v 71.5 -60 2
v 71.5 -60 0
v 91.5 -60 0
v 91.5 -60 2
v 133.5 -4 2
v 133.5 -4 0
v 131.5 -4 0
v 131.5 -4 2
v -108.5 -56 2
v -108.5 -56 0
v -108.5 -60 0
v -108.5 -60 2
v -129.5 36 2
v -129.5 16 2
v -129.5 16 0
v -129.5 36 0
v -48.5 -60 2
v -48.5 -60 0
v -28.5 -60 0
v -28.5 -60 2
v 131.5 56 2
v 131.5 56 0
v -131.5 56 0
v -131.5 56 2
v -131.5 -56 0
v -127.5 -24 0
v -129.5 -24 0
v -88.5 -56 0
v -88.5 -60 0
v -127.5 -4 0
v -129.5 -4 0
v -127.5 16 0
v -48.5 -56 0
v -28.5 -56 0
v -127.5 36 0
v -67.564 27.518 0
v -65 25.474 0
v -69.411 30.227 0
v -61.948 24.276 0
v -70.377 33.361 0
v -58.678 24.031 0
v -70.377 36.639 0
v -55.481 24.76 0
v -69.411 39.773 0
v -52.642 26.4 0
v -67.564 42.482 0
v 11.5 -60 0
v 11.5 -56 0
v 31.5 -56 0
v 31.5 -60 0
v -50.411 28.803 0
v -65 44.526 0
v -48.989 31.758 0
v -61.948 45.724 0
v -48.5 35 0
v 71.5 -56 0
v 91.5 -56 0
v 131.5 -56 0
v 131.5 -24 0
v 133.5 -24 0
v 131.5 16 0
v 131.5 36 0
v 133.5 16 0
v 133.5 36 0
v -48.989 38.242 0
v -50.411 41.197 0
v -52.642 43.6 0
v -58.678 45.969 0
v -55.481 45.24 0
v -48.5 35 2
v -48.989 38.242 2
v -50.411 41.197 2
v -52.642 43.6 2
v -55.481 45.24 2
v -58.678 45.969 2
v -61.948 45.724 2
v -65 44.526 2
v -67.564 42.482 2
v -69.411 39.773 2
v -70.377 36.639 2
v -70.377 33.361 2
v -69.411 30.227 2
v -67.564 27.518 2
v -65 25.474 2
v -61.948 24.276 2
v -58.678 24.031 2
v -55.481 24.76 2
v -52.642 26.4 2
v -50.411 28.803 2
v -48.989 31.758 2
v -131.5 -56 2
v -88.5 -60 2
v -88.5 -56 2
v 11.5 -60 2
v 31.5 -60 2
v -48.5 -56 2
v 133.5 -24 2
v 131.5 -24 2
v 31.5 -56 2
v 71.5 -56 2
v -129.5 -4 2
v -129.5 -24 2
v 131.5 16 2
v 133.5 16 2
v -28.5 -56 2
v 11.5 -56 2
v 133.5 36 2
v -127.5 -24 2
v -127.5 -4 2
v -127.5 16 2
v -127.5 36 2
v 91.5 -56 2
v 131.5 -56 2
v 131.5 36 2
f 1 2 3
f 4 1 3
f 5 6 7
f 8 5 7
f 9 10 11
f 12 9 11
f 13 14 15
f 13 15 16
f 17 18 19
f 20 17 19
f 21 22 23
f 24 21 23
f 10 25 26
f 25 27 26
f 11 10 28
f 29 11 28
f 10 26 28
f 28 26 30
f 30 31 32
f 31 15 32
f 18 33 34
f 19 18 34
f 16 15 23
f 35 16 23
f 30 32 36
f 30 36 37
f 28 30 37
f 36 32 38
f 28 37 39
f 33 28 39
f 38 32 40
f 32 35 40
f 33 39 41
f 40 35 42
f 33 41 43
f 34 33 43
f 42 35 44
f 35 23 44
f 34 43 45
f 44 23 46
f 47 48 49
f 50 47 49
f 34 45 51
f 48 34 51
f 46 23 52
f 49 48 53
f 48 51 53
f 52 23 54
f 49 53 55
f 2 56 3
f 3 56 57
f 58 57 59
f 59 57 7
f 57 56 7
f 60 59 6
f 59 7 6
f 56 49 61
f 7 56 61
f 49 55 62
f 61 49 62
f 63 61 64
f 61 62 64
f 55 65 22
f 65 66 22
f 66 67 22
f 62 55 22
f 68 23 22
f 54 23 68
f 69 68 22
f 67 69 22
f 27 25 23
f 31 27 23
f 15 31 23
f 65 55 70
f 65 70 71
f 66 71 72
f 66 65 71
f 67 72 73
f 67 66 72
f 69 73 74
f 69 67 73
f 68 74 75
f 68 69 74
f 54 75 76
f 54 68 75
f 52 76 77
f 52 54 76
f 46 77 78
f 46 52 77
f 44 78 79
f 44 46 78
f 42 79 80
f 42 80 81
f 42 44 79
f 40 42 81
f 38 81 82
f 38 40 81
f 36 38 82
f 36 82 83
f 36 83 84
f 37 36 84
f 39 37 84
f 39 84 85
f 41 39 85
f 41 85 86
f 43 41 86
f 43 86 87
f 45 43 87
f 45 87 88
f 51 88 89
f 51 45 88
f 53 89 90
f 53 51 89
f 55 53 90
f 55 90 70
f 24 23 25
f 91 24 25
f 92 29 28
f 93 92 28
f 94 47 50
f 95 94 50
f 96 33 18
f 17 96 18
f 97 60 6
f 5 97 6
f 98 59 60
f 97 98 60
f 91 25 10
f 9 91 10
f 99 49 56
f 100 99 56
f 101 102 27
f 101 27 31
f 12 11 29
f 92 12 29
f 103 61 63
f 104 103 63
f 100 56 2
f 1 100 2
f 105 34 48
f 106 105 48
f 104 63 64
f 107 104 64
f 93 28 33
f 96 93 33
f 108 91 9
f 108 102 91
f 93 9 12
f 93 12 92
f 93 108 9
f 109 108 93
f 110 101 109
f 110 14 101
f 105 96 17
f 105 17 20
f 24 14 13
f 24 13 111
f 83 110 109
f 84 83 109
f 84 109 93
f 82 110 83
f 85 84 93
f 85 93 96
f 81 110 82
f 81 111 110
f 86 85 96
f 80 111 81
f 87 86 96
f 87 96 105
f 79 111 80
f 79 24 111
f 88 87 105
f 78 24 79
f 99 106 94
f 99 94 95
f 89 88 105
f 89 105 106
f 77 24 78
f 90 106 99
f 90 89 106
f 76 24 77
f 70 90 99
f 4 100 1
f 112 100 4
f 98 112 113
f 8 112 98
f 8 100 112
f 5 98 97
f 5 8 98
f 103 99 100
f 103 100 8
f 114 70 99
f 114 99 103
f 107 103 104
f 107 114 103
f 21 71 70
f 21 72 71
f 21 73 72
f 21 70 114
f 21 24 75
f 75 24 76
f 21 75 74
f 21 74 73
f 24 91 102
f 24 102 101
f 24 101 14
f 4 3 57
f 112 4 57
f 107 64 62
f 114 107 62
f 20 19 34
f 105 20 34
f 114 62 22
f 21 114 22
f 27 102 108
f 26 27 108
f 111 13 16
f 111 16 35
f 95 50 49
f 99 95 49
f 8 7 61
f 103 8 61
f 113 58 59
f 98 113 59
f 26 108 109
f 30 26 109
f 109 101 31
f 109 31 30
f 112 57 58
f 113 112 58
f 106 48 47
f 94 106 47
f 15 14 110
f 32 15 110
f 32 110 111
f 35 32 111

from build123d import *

# Parameters (mm, degrees)
SKETCH1_R           = 11
BOSS_EXTRUDE1_DEPTH = 2
SKETCH2_W           = 2
SKETCH2_H           = 20
CUT_EXTRUDE1_DEPTH  = 10


with BuildPart() as part:
    # Sketch1 → Boss-Extrude1 (new body)
    with BuildSketch(Plane.XY):
        Polygon((11.5, -56), (11.5, -60), (31.5, -60), (31.5, -56), (71.5, -56), (71.5, -60), (91.5, -60), (91.5, -56), (131.5, -56), (131.5, -24), (133.5, -24), (133.5, -4), (131.5, -4), (131.5, 16), (133.5, 16), (133.5, 36), (131.5, 36), (131.5, 56), (-131.5, 56), (-131.5, 36), (-131.5, 16), (-131.5, -4), (-131.5, -24), (-131.5, -56), (-108.5, -56), (-108.5, -60), (-88.5, -60), (-88.5, -56), (-48.5, -56), (-48.5, -60), (-28.5, -60), (-28.5, -56), align=None)
        with Locations((-59.5, 35)):
            Circle(SKETCH1_R, mode=Mode.SUBTRACT)
    extrude(amount=BOSS_EXTRUDE1_DEPTH)

    # Sketch2 → Cut-Extrude1 (cut)
    with BuildSketch(Plane.XY.offset(2)):
        with Locations((-128.5, 26)):
            Rectangle(SKETCH2_W, SKETCH2_H)
        with Locations((-128.5, -14)):
            Rectangle(SKETCH2_W, SKETCH2_H)
    extrude(amount=-CUT_EXTRUDE1_DEPTH, mode=Mode.SUBTRACT)


solid = part.part
